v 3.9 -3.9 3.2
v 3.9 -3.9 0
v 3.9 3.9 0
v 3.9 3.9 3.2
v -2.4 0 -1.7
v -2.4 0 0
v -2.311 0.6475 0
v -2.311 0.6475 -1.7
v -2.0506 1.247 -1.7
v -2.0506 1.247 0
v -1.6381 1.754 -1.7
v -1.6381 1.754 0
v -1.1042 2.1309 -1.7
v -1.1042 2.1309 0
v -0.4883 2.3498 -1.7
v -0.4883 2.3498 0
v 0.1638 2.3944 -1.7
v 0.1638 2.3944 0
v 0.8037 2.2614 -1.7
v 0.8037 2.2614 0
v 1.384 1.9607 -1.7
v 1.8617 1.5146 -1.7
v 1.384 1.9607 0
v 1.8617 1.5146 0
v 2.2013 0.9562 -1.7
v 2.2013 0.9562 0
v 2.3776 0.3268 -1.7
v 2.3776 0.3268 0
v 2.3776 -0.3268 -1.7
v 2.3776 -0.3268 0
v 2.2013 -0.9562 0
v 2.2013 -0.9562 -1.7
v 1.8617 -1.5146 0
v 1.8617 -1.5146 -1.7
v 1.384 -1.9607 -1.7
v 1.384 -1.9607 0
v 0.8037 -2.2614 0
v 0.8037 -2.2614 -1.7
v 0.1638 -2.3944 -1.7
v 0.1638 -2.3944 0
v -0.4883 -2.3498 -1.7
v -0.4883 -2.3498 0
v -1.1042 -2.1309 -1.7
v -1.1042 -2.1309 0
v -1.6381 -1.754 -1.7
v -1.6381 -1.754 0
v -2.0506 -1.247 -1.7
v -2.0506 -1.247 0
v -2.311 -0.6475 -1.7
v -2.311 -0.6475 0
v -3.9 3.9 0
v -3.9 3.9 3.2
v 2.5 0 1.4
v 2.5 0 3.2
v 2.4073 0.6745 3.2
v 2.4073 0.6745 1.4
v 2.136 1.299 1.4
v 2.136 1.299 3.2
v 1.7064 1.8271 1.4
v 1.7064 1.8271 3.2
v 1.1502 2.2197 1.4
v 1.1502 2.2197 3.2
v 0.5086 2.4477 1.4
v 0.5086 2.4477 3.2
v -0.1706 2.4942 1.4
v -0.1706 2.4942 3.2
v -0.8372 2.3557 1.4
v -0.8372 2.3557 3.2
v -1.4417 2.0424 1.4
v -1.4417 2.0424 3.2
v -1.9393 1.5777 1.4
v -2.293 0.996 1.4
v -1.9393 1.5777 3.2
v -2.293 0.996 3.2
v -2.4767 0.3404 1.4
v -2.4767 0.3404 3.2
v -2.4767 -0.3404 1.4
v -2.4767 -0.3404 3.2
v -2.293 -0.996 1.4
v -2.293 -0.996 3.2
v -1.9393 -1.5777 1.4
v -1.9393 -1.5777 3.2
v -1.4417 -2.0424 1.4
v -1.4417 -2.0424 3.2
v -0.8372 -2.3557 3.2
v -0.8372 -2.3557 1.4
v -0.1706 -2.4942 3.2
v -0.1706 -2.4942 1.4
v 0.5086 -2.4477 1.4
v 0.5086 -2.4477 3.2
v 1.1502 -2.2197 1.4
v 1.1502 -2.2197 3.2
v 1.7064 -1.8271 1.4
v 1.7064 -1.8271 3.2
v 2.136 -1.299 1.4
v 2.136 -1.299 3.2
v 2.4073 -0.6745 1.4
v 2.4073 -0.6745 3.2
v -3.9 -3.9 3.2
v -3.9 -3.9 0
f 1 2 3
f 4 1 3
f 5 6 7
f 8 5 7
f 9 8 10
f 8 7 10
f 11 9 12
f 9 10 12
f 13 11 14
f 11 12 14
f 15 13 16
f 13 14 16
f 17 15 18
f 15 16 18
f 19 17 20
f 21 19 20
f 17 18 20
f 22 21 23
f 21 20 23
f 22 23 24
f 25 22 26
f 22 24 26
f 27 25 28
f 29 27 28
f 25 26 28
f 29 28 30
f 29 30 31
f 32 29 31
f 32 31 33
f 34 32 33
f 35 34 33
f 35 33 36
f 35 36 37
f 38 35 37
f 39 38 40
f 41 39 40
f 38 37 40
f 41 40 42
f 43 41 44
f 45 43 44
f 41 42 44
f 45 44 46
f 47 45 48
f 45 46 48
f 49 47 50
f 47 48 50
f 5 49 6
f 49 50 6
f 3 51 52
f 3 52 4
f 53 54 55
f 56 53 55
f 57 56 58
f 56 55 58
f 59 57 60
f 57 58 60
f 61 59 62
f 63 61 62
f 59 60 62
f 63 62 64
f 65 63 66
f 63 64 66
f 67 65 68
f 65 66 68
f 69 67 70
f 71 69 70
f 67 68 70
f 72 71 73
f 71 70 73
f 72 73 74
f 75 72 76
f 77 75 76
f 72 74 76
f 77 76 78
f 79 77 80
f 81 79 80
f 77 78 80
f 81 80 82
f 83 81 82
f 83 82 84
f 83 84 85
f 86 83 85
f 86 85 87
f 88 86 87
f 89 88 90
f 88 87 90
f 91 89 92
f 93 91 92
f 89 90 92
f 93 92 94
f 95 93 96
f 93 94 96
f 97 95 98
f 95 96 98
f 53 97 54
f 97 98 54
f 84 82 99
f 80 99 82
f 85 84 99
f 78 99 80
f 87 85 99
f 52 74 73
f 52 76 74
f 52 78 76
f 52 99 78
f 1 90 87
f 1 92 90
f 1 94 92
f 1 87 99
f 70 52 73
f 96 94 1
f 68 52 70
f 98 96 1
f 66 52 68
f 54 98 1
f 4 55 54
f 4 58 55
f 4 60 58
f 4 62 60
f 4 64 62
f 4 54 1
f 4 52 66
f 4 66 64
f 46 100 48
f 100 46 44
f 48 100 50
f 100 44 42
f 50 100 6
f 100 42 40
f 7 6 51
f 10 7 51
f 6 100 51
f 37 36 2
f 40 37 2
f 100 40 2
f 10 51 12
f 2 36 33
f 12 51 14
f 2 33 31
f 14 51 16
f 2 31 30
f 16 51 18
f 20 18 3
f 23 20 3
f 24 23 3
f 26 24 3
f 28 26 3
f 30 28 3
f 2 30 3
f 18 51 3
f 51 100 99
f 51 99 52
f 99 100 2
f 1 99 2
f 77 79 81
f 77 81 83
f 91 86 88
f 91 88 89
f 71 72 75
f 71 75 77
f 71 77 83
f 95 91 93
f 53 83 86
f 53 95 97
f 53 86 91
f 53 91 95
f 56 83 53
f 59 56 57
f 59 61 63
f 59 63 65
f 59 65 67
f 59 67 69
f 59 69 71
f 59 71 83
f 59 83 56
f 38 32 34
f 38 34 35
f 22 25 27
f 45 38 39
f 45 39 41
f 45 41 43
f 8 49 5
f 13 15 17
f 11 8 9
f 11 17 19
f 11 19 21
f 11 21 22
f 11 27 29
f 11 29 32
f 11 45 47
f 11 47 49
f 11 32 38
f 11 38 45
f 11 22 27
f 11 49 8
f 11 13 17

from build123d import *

# Parameters (mm, degrees)
SKETCH_1_W          = 7.8
SKETCH_1_H          = 7.8
EXTRUDE_1_DEPTH     = 3.2
SKETCH_2_R          = 2.5
CUT_EXTRUDE_1_DEPTH = 1.8
SKETCH_3_R          = 2.4
EXTRUDE_2_DEPTH     = 1.7


with BuildPart() as part:
    # Эскиз1 → Бобышка-Вытянуть1 (new body)
    with BuildSketch(Plane.XY):
        Rectangle(SKETCH_1_W, SKETCH_1_H)
    extrude(amount=EXTRUDE_1_DEPTH)

    # Эскиз2 → Вырез-Вытянуть1 (cut)
    with BuildSketch(Plane.XY.offset(3.2)):
        Circle(SKETCH_2_R)
    extrude(amount=-CUT_EXTRUDE_1_DEPTH, mode=Mode.SUBTRACT)

    # Эскиз3 → Бобышка-Вытянуть2 (add)
    with BuildSketch(Plane(origin=(0, 0, 0), x_dir=(-1, 0, 0), z_dir=(0, 0, -1))):
        Circle(SKETCH_3_R)
    extrude(amount=EXTRUDE_2_DEPTH)


solid = part.part
